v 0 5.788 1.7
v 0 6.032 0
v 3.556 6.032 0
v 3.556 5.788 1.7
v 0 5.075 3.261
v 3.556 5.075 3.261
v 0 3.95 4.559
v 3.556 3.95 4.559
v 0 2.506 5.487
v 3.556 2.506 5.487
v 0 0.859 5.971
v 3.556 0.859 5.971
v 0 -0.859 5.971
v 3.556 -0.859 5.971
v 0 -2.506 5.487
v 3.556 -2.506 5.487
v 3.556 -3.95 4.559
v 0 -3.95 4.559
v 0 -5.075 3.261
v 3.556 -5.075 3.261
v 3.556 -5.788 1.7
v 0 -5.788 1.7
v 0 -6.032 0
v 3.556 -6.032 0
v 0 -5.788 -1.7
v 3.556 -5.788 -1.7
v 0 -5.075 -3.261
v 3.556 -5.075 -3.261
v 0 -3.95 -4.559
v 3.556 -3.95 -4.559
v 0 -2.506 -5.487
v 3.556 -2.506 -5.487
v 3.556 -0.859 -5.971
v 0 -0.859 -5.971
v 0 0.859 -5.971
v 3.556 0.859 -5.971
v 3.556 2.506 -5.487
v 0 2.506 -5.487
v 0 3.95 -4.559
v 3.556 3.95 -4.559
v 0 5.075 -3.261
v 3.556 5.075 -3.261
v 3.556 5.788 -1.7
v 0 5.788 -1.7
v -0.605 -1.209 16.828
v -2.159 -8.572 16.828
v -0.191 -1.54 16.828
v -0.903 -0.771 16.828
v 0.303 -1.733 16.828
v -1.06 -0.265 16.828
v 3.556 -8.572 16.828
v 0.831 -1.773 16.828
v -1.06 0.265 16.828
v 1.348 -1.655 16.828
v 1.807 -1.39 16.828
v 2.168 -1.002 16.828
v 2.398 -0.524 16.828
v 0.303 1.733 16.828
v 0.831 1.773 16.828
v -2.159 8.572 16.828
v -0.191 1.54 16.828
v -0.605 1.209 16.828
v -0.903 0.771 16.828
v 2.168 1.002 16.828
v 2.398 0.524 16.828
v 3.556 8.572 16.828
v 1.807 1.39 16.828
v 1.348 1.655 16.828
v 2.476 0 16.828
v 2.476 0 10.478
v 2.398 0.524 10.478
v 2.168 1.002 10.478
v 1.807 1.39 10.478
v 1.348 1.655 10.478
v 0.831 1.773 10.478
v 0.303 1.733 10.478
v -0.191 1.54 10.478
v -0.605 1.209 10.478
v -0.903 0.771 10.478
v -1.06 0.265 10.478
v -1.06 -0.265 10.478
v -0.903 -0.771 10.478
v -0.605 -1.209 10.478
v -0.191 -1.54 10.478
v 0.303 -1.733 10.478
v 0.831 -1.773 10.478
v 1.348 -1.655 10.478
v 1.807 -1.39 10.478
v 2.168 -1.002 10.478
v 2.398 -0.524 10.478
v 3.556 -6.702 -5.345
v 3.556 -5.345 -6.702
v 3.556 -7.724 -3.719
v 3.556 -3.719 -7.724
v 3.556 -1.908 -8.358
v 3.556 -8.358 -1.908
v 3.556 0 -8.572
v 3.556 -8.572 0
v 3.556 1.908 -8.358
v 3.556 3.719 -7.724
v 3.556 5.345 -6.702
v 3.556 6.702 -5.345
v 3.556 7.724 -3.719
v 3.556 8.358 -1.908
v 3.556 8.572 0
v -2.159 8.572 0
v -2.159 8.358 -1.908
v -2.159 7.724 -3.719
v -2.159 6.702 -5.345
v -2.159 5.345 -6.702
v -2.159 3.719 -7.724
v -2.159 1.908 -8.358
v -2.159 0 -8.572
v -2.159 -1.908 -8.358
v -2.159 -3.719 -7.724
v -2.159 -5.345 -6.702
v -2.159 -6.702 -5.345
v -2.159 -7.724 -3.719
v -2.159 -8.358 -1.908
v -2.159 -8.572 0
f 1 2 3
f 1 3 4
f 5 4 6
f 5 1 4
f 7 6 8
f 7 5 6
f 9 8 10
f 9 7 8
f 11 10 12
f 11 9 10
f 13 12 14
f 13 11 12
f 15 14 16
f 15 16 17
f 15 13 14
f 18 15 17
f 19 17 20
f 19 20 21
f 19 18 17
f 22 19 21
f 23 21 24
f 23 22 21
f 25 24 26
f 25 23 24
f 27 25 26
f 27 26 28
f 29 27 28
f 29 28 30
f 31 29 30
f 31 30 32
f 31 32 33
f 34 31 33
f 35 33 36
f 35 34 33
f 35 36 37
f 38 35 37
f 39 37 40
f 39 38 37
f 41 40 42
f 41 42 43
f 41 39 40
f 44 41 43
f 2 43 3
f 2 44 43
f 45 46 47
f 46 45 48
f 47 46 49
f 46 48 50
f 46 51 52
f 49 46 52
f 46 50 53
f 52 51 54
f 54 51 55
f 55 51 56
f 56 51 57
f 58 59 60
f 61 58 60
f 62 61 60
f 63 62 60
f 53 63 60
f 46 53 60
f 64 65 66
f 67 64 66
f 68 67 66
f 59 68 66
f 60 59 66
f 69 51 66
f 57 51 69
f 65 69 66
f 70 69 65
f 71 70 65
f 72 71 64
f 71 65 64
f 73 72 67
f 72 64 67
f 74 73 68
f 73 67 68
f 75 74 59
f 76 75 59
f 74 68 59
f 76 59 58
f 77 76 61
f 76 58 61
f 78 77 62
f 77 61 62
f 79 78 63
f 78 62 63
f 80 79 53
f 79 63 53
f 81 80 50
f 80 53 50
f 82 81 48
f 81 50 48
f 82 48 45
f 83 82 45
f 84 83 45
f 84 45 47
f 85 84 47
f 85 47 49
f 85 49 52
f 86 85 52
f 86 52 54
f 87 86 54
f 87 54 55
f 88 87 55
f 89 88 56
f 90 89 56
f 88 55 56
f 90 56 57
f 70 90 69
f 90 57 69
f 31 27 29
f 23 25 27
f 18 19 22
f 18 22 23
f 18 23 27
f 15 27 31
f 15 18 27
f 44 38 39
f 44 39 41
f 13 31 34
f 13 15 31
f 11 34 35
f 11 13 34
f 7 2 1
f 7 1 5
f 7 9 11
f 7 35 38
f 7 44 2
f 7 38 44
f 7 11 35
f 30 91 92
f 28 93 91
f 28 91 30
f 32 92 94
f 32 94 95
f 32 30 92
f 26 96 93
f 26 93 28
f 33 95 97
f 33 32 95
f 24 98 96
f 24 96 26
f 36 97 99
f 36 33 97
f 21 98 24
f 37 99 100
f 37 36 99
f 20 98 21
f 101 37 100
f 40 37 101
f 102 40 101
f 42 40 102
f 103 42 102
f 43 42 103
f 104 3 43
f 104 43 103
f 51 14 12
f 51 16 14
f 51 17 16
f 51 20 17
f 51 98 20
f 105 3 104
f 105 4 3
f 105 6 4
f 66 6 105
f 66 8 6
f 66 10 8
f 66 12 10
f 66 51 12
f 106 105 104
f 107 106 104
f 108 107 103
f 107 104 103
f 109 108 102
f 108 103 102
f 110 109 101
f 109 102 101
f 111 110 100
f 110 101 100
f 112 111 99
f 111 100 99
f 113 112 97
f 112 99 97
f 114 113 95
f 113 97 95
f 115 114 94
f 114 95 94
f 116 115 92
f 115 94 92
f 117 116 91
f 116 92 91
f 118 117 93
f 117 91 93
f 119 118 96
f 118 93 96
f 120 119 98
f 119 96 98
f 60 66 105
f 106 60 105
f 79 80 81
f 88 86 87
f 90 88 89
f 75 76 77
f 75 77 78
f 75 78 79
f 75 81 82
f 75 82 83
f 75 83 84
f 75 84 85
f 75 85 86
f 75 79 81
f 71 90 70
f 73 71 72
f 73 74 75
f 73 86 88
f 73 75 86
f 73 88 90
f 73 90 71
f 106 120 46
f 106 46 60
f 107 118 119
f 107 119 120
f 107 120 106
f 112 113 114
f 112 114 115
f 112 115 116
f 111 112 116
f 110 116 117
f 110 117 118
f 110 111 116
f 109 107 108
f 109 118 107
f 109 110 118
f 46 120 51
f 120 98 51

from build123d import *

# Parameters (mm, degrees)
F0_R      = 6.0325
F1_DEPTH  = 3.556
F1_FACE_R = 6.0325
F2_DEPTH  = 2.159
F3_R      = 1.778
F4_DEPTH  = 6.35


with BuildPart() as f1:
    # F0 (on Right) → F1 (new body)
    with BuildSketch(Plane.YZ):
        with BuildLine():
            ThreePointArc((-8.5725, 0), (0, -8.5725), (8.5725, 0))
            ThreePointArc((8.5725, 0), (0, 8.5725), (-8.5725, 0))
        make_face()
        Circle(F0_R, mode=Mode.SUBTRACT)
        with BuildLine():
            ThreePointArc((-8.5725, 0), (0, 8.5725), (8.5725, 0))
            Line((8.5725, 0), (8.5725, 16.8275))
            Line((8.5725, 16.8275), (-8.5725, 16.8275))
            Line((-8.5725, 16.8275), (-8.5725, 0))
        make_face()
    extrude(amount=F1_DEPTH)

    # F1_face (on face) + F0 (on Right) → F2 (join)
    with BuildSketch(Plane(origin=(0, 0, 6.9314125223), x_dir=(0, 1, 0), z_dir=(-1, 0, 0))):
        with BuildLine():
            ThreePointArc((8.5725, 6.9314125223), (0, 15.5039125223), (-8.5725, 6.9314125223))
            Line((-8.5725, 6.9314125223), (-8.5725, -9.8960874777))
            Line((-8.5725, -9.8960874777), (8.5725, -9.8960874777))
            Line((8.5725, -9.8960874777), (8.5725, 6.9314125223))
        make_face()
        with Locations((0, 6.9314125223)):
            Circle(F1_FACE_R, mode=Mode.SUBTRACT)
    with BuildSketch(Plane.YZ):
        Circle(F0_R)
    extrude(amount=F2_DEPTH, dir=(-1, 0, 0))

    # F3 (on face) → F4 (cut)
    with BuildSketch(Plane.XY.offset(16.8275)):
        with Locations((0.6985, 0)):
            Circle(F3_R)
    extrude(amount=-F4_DEPTH, mode=Mode.SUBTRACT)


solid = f1.part
